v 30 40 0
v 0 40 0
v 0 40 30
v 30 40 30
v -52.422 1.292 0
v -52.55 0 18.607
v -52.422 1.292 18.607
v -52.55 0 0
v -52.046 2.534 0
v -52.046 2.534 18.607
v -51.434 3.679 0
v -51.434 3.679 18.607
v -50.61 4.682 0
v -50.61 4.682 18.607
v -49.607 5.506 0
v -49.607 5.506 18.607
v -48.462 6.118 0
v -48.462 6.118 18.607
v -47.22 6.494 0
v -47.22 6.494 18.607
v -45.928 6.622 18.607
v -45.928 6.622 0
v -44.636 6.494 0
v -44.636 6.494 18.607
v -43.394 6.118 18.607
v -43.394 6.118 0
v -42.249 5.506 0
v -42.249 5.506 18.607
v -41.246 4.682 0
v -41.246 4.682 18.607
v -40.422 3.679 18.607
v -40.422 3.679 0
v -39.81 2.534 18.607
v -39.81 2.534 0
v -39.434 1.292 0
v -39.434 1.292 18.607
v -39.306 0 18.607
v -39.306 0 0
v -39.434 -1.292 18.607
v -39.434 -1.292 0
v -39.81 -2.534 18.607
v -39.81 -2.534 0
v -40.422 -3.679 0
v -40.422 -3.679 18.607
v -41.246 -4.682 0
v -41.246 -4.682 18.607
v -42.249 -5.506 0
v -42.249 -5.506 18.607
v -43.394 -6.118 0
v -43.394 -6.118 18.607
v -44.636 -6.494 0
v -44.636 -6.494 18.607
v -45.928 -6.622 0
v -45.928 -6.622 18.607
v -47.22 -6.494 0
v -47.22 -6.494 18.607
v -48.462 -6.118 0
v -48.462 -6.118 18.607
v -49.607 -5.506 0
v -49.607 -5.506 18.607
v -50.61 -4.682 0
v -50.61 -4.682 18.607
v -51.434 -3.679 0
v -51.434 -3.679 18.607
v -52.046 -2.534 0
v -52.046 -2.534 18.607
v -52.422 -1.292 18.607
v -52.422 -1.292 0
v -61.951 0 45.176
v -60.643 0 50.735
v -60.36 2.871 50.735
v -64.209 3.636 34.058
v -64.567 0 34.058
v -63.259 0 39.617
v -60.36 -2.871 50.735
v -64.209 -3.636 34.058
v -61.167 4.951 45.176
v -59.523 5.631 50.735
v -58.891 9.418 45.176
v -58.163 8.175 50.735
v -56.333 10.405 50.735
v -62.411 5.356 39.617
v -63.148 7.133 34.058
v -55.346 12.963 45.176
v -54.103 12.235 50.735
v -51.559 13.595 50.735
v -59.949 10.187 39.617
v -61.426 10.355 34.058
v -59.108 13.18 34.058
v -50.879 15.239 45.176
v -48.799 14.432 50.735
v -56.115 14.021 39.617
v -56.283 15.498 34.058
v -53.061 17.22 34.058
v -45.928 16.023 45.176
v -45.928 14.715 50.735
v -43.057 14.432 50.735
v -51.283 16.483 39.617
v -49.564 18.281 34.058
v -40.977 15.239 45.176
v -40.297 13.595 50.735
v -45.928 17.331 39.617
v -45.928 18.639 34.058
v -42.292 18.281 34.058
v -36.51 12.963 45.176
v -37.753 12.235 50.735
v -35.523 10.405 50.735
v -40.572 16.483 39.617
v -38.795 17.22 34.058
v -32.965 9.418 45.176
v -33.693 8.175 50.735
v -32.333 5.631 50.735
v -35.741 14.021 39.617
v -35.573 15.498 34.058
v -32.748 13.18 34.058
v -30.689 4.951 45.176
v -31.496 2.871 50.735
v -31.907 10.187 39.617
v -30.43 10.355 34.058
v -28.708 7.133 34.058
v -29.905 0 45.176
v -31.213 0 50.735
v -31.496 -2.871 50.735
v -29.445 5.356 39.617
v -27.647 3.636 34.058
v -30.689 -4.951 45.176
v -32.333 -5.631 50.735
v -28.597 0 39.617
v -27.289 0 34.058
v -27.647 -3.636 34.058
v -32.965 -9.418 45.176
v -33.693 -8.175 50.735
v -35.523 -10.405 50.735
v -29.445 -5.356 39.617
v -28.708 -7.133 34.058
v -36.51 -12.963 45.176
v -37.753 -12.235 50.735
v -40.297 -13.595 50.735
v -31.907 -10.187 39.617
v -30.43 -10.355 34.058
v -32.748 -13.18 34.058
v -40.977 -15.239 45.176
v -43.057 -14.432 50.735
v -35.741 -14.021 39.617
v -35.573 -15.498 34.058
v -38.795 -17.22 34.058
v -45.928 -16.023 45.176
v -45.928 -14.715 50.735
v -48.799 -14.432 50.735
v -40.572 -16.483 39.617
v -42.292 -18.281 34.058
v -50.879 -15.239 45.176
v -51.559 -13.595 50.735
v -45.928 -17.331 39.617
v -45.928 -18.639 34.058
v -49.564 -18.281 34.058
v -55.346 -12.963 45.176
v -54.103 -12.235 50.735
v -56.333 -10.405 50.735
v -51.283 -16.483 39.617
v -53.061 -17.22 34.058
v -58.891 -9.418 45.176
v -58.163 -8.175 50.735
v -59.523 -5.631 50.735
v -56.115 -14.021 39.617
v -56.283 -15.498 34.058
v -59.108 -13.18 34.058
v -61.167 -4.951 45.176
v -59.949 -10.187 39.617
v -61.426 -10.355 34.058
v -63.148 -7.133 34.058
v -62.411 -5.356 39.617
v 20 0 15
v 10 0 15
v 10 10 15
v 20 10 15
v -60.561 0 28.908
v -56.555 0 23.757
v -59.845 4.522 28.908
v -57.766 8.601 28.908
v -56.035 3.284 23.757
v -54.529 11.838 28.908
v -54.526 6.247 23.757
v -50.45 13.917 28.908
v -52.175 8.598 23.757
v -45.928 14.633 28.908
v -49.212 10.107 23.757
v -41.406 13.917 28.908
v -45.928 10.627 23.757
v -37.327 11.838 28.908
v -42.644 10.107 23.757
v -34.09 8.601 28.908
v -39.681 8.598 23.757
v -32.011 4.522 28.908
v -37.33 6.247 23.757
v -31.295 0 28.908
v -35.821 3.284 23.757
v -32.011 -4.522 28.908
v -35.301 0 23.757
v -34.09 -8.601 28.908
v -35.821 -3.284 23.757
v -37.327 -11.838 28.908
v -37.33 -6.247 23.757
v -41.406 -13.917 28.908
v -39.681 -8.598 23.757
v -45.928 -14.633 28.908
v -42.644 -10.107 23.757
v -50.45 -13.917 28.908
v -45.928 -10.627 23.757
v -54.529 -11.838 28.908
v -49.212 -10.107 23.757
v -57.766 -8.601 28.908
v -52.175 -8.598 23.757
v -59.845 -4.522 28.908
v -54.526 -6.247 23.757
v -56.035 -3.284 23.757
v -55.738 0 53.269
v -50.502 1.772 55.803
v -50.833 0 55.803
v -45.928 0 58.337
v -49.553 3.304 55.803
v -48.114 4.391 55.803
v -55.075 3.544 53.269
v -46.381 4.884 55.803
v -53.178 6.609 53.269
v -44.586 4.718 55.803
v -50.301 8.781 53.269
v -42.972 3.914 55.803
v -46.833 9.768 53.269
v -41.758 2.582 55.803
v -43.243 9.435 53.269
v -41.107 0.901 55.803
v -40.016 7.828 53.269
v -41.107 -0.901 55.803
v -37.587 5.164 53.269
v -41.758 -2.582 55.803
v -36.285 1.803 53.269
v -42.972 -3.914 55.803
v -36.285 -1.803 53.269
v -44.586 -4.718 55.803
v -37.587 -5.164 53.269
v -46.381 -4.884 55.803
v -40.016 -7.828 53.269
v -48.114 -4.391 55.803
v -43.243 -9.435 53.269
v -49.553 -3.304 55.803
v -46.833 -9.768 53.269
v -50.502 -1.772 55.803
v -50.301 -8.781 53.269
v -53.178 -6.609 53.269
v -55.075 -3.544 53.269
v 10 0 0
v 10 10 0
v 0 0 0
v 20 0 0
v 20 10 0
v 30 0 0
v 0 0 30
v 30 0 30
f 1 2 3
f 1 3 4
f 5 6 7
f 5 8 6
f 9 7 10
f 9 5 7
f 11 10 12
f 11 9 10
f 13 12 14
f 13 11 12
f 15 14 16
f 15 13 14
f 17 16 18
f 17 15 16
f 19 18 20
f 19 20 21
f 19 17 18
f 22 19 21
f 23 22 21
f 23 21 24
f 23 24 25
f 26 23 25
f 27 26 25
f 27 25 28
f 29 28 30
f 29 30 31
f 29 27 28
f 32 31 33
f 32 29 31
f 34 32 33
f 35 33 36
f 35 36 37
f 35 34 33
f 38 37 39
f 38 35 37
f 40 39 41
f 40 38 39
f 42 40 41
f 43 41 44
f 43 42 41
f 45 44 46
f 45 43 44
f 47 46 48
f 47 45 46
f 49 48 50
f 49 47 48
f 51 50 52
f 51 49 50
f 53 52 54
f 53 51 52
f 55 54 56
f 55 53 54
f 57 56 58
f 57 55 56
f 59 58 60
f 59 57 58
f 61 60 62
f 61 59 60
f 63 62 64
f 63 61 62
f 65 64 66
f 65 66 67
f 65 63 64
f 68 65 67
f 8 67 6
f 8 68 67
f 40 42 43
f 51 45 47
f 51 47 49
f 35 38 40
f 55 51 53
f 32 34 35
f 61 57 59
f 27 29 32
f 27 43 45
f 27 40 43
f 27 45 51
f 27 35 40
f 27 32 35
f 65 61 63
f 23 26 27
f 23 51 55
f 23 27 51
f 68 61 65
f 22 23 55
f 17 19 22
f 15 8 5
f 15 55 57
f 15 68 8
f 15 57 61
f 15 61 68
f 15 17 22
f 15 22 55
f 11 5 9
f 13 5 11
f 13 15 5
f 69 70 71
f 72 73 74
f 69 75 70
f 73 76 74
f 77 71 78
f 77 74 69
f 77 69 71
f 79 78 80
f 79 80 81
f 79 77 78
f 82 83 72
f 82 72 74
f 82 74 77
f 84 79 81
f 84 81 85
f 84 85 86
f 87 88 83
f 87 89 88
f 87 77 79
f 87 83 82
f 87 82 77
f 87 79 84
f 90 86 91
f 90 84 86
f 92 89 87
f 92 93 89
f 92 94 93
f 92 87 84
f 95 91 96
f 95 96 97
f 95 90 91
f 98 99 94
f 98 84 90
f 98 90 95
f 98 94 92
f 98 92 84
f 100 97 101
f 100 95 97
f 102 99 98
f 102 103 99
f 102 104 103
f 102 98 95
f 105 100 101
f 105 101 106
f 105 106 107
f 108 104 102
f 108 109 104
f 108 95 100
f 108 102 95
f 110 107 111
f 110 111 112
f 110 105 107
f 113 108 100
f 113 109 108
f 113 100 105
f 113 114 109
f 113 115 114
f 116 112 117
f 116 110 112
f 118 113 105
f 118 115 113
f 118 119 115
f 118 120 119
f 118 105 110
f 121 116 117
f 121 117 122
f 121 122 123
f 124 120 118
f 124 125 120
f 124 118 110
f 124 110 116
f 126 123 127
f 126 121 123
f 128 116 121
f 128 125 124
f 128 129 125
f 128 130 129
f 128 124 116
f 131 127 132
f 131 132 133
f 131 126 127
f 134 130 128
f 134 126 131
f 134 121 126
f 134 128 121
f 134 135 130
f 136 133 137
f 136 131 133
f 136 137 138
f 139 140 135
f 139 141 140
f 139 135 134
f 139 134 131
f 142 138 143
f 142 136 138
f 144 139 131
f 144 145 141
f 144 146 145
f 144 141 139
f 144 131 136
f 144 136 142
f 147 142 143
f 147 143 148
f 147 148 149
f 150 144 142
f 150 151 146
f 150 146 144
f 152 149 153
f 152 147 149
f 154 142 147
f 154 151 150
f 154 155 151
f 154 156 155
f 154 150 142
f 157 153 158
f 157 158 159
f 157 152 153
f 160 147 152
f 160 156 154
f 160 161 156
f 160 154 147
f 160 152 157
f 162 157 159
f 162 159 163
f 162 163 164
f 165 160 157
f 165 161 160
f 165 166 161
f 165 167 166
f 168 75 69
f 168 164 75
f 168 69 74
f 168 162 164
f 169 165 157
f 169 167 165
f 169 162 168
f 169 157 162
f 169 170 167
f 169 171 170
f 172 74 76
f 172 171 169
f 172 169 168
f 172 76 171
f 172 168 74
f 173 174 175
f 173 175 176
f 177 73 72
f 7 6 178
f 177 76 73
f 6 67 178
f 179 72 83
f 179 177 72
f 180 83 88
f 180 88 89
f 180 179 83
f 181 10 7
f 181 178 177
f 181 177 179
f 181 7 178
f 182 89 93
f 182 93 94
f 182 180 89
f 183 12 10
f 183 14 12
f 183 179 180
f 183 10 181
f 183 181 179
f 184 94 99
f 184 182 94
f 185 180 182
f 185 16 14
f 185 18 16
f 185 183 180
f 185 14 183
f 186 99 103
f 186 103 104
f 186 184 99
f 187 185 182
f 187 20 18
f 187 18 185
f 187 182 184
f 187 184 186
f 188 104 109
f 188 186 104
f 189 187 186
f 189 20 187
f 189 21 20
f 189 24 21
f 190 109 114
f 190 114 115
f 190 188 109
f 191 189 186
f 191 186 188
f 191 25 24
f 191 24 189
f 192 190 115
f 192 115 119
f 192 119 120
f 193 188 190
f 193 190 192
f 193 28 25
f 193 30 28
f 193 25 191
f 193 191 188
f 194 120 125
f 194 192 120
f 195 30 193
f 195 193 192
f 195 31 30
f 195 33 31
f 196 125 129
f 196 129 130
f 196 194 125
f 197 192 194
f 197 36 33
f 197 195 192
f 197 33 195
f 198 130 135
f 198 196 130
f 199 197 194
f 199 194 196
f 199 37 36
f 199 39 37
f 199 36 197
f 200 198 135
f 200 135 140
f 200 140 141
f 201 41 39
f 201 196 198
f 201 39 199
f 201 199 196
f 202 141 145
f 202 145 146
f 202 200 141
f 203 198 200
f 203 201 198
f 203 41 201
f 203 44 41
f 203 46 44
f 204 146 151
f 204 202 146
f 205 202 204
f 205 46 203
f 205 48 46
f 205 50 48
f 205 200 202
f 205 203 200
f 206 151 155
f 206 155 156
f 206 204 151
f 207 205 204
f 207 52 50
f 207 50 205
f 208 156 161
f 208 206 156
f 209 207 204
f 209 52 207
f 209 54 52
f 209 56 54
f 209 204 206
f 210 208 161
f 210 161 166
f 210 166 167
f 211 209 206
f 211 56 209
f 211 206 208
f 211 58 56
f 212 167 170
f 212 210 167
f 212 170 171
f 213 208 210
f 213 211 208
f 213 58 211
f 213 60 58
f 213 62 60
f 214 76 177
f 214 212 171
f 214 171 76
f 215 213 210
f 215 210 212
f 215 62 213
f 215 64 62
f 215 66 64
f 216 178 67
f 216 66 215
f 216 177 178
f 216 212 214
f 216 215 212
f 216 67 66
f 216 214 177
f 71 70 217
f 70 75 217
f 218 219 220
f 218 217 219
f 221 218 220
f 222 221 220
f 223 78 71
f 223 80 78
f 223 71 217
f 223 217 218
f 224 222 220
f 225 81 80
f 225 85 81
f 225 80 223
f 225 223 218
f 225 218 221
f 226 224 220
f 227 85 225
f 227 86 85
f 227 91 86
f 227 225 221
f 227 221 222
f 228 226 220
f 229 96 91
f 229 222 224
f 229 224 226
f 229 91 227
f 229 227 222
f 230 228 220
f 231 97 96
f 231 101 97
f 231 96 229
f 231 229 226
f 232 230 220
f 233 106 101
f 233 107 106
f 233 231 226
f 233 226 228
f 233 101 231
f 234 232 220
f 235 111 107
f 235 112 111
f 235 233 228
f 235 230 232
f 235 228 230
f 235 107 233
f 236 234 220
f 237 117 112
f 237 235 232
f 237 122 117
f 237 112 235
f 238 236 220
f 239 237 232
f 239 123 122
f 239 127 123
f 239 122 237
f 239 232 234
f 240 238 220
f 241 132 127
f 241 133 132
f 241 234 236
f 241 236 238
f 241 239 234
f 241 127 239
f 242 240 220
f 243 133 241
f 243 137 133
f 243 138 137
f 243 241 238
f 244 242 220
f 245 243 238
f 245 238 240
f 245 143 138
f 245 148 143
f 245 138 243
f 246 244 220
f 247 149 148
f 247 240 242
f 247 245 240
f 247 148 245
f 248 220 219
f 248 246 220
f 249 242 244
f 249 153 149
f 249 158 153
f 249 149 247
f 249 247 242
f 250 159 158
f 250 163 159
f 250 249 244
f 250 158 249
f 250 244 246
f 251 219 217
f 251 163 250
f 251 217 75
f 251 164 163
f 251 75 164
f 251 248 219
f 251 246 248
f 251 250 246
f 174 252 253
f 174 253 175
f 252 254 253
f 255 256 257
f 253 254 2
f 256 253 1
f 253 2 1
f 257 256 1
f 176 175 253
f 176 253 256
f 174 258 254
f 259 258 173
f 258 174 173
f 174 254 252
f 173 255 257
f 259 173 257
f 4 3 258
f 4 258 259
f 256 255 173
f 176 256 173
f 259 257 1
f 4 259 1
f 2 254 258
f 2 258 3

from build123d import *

# Parameters (mm, degrees)
F0_W     = 30
F0_H     = 40
F1_DEPTH = 30
F2_W     = 10
F2_H     = 15
F3_DEPTH = 10


with BuildPart() as f1:
    # F0 (on Top) → F1 (new body)
    with BuildSketch(Plane.XY):
        with Locations((15, 20)):
            Rectangle(F0_W, F0_H)
    extrude(amount=F1_DEPTH)

    # F2 (on face) → F3 (cut)
    with BuildSketch(Plane.XZ):
        with Locations((15, 7.5)):
            Rectangle(F2_W, F2_H)
    extrude(amount=-F3_DEPTH, mode=Mode.SUBTRACT)


with BuildPart() as f5:
    # F4 (on Front) → F5 (revolve)
    with BuildSketch(Plane.XZ):
        Polygon((-64.566754, 34.05777), (-52.54963, 18.607184), (-52.54963, 0), (-45.927949, 0), (-45.927949, 58.337264), (-60.642794, 50.734594), align=None)
    revolve(axis=Axis((-45.927949, 0, 29.168632), (0, 0, -1)))


solid = Compound([f1.part, f5.part])
